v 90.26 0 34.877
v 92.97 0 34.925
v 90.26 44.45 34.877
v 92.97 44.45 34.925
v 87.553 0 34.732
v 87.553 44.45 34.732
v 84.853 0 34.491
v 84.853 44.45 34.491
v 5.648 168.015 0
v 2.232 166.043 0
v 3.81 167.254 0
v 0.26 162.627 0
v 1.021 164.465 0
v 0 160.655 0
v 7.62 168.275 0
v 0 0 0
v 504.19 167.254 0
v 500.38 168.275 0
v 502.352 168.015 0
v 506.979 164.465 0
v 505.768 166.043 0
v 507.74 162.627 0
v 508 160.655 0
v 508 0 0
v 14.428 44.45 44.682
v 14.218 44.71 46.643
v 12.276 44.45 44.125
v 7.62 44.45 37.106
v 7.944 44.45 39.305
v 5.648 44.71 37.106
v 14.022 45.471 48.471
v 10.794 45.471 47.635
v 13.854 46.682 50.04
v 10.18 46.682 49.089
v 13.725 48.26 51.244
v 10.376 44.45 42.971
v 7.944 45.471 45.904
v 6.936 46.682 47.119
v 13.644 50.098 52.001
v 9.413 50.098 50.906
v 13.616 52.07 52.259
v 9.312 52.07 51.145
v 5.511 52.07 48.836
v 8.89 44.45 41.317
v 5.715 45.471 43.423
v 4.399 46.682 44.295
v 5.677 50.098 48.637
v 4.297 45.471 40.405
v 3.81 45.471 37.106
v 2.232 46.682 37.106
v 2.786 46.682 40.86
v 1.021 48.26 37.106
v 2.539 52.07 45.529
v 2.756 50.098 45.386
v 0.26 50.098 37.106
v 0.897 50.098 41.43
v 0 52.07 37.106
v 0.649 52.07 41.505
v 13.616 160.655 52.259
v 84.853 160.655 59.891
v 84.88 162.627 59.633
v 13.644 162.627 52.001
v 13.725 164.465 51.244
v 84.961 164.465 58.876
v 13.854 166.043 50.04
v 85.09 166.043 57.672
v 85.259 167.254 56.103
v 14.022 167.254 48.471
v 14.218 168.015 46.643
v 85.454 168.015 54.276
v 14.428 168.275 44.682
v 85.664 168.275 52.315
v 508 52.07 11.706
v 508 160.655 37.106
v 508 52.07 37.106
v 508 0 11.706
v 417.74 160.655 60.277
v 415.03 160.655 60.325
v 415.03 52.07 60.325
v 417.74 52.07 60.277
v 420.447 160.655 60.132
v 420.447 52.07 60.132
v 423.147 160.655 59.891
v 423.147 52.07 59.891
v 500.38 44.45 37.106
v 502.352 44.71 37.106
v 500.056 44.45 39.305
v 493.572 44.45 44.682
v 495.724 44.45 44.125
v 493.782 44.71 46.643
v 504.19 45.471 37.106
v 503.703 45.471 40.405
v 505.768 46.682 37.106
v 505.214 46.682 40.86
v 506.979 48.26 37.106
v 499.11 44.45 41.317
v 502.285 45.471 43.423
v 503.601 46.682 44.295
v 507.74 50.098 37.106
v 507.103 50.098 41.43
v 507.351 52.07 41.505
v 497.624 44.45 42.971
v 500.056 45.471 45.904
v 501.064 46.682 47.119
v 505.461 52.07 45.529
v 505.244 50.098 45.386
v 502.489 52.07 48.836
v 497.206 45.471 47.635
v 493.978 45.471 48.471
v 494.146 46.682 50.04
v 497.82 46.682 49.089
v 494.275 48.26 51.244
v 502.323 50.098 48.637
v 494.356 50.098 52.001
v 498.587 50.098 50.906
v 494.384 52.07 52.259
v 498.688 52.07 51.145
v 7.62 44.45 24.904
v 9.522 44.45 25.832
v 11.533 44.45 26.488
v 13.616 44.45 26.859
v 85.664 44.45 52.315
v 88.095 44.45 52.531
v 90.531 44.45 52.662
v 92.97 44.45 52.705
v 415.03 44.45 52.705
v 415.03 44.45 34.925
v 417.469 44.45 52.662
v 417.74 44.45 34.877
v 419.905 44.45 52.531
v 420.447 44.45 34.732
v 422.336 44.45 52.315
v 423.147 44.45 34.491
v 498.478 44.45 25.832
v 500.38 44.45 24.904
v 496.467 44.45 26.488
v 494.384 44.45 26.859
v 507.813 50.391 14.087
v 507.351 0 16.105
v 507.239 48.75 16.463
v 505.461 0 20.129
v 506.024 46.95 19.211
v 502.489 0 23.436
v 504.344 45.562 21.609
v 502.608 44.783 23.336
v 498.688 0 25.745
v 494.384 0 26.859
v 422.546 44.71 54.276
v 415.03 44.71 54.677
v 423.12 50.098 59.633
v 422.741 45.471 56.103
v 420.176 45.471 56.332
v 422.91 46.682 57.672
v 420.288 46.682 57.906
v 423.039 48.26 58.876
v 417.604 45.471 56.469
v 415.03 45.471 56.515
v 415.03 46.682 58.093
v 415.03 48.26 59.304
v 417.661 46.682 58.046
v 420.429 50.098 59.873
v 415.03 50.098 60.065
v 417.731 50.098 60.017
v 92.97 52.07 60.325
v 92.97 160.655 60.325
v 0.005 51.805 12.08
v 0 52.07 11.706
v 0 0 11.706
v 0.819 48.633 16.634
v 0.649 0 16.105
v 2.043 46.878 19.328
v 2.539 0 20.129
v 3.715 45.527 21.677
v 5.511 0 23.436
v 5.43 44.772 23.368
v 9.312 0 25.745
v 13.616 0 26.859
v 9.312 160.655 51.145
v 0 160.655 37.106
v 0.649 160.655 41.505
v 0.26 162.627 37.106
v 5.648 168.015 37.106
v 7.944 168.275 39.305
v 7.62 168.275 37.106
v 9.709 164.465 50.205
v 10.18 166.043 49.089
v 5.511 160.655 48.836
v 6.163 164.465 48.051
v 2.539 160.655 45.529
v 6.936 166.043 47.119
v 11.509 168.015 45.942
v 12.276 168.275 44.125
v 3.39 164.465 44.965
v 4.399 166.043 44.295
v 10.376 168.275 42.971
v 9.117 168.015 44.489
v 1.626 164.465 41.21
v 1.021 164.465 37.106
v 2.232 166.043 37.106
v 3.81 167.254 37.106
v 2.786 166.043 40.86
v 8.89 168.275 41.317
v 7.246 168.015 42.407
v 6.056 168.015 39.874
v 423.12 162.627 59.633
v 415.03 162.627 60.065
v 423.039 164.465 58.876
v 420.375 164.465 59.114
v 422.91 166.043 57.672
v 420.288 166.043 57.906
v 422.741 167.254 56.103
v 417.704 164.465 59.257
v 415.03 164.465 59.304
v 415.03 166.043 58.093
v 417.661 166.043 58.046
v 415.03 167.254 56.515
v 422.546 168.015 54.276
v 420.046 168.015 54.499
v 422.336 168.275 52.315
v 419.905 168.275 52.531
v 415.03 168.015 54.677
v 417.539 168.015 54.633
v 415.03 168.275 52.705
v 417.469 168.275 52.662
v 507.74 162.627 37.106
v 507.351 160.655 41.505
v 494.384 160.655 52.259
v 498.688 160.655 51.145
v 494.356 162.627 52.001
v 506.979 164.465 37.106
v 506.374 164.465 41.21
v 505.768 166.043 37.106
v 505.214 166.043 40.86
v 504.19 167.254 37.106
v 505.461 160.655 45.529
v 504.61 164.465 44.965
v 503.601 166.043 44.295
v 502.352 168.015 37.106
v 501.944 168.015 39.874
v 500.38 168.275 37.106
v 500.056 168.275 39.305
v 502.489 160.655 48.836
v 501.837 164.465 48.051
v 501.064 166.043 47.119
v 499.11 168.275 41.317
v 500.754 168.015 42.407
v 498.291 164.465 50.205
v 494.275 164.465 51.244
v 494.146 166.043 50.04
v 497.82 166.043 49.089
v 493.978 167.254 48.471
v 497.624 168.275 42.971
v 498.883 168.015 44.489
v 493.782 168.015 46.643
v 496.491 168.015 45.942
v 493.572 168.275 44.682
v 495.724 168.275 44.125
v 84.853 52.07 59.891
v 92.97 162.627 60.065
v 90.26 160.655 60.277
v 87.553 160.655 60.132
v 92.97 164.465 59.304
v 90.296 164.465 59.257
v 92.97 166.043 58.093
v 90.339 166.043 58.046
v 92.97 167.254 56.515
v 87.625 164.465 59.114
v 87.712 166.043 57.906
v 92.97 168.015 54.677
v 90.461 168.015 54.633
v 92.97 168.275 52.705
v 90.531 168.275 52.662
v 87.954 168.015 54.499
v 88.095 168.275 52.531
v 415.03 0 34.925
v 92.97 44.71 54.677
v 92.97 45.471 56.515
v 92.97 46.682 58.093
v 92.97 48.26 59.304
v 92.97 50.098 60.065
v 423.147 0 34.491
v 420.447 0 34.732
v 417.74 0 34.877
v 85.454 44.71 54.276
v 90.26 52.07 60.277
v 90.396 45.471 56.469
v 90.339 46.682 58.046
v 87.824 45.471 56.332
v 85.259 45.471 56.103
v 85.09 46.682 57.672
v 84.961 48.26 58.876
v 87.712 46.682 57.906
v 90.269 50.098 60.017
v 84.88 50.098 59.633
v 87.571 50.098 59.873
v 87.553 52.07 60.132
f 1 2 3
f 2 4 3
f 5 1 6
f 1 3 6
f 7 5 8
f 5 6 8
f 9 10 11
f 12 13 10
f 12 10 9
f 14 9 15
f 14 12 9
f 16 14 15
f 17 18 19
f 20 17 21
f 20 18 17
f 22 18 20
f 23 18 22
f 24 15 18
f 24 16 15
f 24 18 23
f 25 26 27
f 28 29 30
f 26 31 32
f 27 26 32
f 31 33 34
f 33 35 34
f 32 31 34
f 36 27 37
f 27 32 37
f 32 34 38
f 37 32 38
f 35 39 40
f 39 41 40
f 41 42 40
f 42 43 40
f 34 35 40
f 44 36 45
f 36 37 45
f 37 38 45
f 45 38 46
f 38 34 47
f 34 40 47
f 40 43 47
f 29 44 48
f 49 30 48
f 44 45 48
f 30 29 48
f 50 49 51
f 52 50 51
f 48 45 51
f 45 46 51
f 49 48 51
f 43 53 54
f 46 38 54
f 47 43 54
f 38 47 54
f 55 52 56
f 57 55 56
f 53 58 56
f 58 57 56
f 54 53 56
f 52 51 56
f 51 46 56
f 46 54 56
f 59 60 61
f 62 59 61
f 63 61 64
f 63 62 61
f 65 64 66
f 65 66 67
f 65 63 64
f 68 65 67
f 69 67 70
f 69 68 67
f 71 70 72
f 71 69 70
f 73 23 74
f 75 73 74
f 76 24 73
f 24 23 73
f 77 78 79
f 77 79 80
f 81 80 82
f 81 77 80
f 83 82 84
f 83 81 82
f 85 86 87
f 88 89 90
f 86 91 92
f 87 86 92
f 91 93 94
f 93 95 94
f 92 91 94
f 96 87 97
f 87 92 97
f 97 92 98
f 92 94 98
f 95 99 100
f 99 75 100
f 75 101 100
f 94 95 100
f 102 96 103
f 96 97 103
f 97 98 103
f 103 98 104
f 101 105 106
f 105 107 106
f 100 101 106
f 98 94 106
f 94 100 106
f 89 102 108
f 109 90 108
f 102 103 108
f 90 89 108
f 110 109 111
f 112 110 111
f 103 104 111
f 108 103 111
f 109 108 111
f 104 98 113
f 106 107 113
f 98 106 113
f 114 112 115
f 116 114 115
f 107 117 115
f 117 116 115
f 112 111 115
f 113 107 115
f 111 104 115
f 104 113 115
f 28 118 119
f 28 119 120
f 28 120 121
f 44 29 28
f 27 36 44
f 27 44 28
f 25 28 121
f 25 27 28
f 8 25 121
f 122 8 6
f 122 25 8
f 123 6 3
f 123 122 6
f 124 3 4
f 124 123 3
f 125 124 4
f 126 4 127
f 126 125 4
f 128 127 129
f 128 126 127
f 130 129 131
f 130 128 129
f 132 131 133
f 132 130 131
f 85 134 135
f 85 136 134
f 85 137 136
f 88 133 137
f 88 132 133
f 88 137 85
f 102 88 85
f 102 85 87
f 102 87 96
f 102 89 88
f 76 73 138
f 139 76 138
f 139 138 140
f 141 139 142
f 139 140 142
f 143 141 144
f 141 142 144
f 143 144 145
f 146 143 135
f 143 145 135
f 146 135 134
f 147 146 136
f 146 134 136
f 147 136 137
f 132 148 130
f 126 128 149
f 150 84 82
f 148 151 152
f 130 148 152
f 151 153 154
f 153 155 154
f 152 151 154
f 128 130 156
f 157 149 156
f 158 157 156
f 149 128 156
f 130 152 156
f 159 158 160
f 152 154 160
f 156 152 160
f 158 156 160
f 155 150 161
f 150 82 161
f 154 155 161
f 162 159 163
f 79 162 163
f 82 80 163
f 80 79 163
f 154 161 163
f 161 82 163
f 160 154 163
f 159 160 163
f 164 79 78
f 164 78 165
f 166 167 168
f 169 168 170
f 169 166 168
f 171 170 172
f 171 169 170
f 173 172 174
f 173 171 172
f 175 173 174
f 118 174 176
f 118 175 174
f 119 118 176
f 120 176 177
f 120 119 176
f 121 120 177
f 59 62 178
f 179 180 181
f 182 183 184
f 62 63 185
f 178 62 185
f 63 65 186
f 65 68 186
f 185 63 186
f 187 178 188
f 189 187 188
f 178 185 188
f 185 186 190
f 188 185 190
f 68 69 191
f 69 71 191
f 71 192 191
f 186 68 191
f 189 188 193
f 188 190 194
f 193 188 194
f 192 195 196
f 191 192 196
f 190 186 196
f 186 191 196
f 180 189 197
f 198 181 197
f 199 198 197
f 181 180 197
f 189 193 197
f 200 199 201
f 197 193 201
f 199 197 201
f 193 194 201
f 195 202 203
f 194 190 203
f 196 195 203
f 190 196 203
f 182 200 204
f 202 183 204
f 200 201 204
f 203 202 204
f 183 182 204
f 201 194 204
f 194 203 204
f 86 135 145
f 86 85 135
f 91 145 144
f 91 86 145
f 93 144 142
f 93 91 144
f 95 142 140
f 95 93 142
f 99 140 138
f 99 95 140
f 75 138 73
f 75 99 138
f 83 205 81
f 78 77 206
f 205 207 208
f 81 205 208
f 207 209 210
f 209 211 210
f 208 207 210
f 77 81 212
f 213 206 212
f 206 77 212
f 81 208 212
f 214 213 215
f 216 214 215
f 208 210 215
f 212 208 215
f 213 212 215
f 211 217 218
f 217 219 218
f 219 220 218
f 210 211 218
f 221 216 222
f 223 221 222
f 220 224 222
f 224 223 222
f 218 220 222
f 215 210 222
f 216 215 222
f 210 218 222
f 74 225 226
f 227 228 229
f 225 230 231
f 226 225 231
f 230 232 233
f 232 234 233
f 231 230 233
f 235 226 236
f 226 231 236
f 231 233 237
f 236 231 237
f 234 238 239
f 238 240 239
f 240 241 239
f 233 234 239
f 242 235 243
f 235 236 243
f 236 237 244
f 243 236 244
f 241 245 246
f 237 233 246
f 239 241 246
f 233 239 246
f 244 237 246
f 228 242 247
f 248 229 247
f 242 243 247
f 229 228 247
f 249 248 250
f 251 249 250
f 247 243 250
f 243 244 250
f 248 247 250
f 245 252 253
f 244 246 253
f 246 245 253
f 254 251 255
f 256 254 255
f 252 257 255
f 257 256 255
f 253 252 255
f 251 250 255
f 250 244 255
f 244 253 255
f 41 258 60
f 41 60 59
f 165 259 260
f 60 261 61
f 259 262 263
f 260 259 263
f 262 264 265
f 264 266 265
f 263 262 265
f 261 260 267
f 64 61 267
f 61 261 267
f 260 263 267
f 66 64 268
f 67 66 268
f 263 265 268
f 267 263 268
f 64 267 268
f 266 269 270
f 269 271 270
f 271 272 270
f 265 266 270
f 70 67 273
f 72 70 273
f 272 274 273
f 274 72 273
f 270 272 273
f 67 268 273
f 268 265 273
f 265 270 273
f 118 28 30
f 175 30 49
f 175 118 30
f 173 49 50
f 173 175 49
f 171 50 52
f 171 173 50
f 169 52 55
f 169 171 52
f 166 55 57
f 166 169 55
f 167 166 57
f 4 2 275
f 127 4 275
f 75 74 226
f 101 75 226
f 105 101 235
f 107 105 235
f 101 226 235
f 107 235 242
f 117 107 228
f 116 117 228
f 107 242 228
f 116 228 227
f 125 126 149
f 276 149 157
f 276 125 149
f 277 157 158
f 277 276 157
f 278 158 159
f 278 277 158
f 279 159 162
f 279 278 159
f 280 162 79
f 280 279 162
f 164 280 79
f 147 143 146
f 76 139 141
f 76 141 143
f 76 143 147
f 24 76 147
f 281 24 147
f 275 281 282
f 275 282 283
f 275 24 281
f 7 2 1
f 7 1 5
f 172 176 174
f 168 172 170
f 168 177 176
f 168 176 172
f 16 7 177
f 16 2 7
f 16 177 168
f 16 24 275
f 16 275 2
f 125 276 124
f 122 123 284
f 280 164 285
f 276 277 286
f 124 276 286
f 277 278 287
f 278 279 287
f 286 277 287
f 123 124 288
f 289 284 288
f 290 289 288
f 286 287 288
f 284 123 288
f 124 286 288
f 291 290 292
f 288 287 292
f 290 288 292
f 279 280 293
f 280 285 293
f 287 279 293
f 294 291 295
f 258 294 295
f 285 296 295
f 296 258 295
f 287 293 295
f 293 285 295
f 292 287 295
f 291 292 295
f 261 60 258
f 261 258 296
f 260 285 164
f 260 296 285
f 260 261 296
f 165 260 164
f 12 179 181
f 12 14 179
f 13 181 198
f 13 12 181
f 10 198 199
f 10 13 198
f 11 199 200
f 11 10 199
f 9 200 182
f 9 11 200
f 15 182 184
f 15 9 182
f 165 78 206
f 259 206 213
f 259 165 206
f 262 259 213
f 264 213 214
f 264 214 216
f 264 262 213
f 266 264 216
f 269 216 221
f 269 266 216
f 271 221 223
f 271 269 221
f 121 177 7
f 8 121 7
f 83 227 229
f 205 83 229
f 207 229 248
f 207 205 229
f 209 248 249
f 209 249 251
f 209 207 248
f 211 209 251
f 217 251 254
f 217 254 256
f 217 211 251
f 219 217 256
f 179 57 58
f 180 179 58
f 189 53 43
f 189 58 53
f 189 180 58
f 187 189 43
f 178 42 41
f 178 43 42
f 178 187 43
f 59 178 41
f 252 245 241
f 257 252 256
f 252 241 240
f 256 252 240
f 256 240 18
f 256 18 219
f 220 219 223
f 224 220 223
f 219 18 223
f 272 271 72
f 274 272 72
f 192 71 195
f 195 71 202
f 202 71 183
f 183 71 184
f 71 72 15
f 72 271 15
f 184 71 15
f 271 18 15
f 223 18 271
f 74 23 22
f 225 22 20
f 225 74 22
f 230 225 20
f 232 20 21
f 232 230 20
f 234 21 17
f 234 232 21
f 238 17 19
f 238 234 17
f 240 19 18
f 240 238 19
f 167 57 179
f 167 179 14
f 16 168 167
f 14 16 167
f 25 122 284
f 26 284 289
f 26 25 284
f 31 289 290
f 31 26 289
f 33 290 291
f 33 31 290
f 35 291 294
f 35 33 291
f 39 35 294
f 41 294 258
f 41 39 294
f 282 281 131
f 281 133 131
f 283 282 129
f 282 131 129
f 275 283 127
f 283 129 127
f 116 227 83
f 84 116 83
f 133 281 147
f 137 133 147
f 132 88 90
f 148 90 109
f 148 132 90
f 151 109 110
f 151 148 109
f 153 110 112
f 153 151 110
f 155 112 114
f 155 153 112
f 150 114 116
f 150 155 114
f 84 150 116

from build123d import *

# Parameters (mm, degrees)
BOSS_EXTRUDE1_DEPTH = 168.275
CUT_EXTRUDE1_DEPTH  = 44.45
FILLET1_R           = 15.24
FILLET2_R           = 76.2
FILLET3_R           = 7.62
FILLET4_R           = 7.62


with BuildPart() as part:
    # Sketch7 → Boss-Extrude1 (new body)
    with BuildSketch(Plane(origin=(0, 0, 0), x_dir=(1, 0, 0), z_dir=(0, 1, 0))):
        Polygon((0, 0), (508, 0), (508, -50.8), (419.1, -60.325), (88.9, -60.325), (0, -50.8), align=None)
    extrude(amount=BOSS_EXTRUDE1_DEPTH)

    # Sketch10 → Cut-Extrude1 (cut)
    with BuildSketch(Plane.XZ):
        Polygon((0, 50.8), (0, 25.4), (88.9, 34.925), (419.1, 34.925), (508, 25.4), (508, 50.8), (419.1, 60.325), (88.9, 60.325), align=None)
    extrude(amount=-CUT_EXTRUDE1_DEPTH, mode=Mode.SUBTRACT)

    # Fillet1
    fillet1_edges = [part.edges().sort_by_distance(p)[0] for p in [
        (508, 106.3625, 50.8),
        (0, 106.3625, 50.8),
        (508, 22.225, 25.4),
        (0, 22.225, 25.4),
    ]]
    fillet(fillet1_edges, radius=FILLET1_R)

    # Fillet2
    fillet2_edges = [part.edges().sort_by_distance(p)[0] for p in [
        (419.1, 106.3625, 60.325),
        (88.9, 106.3625, 60.325),
        (419.1, 22.225, 34.925),
        (88.9, 22.225, 34.925),
    ]]
    fillet(fillet2_edges, radius=FILLET2_R)

    # Fillet3
    fillet3_edges = [part.edges().sort_by_distance(p)[0] for p in [
        (508, 168.275, 18.552816133),
        (0, 168.275, 18.552816133),
        (49.234552732, 168.275, 56.07513065),
        (3.904199904, 168.275, 47.291761863),
        (504.095800096, 168.275, 47.291761863),
        (458.765447268, 168.275, 56.07513065),
        (254, 168.275, 60.325),
        (88.905795265, 168.275, 60.216512154),
        (419.094204735, 168.275, 60.216512154),
    ]]
    fillet(fillet3_edges, radius=FILLET3_R)

    # Fillet4
    fillet4_edges = [part.edges().sort_by_distance(p)[0] for p in [
        (508, 44.45, 18.552816133),
        (0, 44.45, 18.552816133),
        (458.765447268, 44.45, 56.07513065),
        (3.904199904, 44.45, 47.291761863),
        (504.095800096, 44.45, 47.291761863),
        (254, 44.45, 60.325),
        (49.234552732, 44.45, 56.07513065),
        (88.905795265, 44.45, 60.216512154),
        (419.094204735, 44.45, 60.216512154),
    ]]
    fillet(fillet4_edges, radius=FILLET4_R)


solid = part.part
